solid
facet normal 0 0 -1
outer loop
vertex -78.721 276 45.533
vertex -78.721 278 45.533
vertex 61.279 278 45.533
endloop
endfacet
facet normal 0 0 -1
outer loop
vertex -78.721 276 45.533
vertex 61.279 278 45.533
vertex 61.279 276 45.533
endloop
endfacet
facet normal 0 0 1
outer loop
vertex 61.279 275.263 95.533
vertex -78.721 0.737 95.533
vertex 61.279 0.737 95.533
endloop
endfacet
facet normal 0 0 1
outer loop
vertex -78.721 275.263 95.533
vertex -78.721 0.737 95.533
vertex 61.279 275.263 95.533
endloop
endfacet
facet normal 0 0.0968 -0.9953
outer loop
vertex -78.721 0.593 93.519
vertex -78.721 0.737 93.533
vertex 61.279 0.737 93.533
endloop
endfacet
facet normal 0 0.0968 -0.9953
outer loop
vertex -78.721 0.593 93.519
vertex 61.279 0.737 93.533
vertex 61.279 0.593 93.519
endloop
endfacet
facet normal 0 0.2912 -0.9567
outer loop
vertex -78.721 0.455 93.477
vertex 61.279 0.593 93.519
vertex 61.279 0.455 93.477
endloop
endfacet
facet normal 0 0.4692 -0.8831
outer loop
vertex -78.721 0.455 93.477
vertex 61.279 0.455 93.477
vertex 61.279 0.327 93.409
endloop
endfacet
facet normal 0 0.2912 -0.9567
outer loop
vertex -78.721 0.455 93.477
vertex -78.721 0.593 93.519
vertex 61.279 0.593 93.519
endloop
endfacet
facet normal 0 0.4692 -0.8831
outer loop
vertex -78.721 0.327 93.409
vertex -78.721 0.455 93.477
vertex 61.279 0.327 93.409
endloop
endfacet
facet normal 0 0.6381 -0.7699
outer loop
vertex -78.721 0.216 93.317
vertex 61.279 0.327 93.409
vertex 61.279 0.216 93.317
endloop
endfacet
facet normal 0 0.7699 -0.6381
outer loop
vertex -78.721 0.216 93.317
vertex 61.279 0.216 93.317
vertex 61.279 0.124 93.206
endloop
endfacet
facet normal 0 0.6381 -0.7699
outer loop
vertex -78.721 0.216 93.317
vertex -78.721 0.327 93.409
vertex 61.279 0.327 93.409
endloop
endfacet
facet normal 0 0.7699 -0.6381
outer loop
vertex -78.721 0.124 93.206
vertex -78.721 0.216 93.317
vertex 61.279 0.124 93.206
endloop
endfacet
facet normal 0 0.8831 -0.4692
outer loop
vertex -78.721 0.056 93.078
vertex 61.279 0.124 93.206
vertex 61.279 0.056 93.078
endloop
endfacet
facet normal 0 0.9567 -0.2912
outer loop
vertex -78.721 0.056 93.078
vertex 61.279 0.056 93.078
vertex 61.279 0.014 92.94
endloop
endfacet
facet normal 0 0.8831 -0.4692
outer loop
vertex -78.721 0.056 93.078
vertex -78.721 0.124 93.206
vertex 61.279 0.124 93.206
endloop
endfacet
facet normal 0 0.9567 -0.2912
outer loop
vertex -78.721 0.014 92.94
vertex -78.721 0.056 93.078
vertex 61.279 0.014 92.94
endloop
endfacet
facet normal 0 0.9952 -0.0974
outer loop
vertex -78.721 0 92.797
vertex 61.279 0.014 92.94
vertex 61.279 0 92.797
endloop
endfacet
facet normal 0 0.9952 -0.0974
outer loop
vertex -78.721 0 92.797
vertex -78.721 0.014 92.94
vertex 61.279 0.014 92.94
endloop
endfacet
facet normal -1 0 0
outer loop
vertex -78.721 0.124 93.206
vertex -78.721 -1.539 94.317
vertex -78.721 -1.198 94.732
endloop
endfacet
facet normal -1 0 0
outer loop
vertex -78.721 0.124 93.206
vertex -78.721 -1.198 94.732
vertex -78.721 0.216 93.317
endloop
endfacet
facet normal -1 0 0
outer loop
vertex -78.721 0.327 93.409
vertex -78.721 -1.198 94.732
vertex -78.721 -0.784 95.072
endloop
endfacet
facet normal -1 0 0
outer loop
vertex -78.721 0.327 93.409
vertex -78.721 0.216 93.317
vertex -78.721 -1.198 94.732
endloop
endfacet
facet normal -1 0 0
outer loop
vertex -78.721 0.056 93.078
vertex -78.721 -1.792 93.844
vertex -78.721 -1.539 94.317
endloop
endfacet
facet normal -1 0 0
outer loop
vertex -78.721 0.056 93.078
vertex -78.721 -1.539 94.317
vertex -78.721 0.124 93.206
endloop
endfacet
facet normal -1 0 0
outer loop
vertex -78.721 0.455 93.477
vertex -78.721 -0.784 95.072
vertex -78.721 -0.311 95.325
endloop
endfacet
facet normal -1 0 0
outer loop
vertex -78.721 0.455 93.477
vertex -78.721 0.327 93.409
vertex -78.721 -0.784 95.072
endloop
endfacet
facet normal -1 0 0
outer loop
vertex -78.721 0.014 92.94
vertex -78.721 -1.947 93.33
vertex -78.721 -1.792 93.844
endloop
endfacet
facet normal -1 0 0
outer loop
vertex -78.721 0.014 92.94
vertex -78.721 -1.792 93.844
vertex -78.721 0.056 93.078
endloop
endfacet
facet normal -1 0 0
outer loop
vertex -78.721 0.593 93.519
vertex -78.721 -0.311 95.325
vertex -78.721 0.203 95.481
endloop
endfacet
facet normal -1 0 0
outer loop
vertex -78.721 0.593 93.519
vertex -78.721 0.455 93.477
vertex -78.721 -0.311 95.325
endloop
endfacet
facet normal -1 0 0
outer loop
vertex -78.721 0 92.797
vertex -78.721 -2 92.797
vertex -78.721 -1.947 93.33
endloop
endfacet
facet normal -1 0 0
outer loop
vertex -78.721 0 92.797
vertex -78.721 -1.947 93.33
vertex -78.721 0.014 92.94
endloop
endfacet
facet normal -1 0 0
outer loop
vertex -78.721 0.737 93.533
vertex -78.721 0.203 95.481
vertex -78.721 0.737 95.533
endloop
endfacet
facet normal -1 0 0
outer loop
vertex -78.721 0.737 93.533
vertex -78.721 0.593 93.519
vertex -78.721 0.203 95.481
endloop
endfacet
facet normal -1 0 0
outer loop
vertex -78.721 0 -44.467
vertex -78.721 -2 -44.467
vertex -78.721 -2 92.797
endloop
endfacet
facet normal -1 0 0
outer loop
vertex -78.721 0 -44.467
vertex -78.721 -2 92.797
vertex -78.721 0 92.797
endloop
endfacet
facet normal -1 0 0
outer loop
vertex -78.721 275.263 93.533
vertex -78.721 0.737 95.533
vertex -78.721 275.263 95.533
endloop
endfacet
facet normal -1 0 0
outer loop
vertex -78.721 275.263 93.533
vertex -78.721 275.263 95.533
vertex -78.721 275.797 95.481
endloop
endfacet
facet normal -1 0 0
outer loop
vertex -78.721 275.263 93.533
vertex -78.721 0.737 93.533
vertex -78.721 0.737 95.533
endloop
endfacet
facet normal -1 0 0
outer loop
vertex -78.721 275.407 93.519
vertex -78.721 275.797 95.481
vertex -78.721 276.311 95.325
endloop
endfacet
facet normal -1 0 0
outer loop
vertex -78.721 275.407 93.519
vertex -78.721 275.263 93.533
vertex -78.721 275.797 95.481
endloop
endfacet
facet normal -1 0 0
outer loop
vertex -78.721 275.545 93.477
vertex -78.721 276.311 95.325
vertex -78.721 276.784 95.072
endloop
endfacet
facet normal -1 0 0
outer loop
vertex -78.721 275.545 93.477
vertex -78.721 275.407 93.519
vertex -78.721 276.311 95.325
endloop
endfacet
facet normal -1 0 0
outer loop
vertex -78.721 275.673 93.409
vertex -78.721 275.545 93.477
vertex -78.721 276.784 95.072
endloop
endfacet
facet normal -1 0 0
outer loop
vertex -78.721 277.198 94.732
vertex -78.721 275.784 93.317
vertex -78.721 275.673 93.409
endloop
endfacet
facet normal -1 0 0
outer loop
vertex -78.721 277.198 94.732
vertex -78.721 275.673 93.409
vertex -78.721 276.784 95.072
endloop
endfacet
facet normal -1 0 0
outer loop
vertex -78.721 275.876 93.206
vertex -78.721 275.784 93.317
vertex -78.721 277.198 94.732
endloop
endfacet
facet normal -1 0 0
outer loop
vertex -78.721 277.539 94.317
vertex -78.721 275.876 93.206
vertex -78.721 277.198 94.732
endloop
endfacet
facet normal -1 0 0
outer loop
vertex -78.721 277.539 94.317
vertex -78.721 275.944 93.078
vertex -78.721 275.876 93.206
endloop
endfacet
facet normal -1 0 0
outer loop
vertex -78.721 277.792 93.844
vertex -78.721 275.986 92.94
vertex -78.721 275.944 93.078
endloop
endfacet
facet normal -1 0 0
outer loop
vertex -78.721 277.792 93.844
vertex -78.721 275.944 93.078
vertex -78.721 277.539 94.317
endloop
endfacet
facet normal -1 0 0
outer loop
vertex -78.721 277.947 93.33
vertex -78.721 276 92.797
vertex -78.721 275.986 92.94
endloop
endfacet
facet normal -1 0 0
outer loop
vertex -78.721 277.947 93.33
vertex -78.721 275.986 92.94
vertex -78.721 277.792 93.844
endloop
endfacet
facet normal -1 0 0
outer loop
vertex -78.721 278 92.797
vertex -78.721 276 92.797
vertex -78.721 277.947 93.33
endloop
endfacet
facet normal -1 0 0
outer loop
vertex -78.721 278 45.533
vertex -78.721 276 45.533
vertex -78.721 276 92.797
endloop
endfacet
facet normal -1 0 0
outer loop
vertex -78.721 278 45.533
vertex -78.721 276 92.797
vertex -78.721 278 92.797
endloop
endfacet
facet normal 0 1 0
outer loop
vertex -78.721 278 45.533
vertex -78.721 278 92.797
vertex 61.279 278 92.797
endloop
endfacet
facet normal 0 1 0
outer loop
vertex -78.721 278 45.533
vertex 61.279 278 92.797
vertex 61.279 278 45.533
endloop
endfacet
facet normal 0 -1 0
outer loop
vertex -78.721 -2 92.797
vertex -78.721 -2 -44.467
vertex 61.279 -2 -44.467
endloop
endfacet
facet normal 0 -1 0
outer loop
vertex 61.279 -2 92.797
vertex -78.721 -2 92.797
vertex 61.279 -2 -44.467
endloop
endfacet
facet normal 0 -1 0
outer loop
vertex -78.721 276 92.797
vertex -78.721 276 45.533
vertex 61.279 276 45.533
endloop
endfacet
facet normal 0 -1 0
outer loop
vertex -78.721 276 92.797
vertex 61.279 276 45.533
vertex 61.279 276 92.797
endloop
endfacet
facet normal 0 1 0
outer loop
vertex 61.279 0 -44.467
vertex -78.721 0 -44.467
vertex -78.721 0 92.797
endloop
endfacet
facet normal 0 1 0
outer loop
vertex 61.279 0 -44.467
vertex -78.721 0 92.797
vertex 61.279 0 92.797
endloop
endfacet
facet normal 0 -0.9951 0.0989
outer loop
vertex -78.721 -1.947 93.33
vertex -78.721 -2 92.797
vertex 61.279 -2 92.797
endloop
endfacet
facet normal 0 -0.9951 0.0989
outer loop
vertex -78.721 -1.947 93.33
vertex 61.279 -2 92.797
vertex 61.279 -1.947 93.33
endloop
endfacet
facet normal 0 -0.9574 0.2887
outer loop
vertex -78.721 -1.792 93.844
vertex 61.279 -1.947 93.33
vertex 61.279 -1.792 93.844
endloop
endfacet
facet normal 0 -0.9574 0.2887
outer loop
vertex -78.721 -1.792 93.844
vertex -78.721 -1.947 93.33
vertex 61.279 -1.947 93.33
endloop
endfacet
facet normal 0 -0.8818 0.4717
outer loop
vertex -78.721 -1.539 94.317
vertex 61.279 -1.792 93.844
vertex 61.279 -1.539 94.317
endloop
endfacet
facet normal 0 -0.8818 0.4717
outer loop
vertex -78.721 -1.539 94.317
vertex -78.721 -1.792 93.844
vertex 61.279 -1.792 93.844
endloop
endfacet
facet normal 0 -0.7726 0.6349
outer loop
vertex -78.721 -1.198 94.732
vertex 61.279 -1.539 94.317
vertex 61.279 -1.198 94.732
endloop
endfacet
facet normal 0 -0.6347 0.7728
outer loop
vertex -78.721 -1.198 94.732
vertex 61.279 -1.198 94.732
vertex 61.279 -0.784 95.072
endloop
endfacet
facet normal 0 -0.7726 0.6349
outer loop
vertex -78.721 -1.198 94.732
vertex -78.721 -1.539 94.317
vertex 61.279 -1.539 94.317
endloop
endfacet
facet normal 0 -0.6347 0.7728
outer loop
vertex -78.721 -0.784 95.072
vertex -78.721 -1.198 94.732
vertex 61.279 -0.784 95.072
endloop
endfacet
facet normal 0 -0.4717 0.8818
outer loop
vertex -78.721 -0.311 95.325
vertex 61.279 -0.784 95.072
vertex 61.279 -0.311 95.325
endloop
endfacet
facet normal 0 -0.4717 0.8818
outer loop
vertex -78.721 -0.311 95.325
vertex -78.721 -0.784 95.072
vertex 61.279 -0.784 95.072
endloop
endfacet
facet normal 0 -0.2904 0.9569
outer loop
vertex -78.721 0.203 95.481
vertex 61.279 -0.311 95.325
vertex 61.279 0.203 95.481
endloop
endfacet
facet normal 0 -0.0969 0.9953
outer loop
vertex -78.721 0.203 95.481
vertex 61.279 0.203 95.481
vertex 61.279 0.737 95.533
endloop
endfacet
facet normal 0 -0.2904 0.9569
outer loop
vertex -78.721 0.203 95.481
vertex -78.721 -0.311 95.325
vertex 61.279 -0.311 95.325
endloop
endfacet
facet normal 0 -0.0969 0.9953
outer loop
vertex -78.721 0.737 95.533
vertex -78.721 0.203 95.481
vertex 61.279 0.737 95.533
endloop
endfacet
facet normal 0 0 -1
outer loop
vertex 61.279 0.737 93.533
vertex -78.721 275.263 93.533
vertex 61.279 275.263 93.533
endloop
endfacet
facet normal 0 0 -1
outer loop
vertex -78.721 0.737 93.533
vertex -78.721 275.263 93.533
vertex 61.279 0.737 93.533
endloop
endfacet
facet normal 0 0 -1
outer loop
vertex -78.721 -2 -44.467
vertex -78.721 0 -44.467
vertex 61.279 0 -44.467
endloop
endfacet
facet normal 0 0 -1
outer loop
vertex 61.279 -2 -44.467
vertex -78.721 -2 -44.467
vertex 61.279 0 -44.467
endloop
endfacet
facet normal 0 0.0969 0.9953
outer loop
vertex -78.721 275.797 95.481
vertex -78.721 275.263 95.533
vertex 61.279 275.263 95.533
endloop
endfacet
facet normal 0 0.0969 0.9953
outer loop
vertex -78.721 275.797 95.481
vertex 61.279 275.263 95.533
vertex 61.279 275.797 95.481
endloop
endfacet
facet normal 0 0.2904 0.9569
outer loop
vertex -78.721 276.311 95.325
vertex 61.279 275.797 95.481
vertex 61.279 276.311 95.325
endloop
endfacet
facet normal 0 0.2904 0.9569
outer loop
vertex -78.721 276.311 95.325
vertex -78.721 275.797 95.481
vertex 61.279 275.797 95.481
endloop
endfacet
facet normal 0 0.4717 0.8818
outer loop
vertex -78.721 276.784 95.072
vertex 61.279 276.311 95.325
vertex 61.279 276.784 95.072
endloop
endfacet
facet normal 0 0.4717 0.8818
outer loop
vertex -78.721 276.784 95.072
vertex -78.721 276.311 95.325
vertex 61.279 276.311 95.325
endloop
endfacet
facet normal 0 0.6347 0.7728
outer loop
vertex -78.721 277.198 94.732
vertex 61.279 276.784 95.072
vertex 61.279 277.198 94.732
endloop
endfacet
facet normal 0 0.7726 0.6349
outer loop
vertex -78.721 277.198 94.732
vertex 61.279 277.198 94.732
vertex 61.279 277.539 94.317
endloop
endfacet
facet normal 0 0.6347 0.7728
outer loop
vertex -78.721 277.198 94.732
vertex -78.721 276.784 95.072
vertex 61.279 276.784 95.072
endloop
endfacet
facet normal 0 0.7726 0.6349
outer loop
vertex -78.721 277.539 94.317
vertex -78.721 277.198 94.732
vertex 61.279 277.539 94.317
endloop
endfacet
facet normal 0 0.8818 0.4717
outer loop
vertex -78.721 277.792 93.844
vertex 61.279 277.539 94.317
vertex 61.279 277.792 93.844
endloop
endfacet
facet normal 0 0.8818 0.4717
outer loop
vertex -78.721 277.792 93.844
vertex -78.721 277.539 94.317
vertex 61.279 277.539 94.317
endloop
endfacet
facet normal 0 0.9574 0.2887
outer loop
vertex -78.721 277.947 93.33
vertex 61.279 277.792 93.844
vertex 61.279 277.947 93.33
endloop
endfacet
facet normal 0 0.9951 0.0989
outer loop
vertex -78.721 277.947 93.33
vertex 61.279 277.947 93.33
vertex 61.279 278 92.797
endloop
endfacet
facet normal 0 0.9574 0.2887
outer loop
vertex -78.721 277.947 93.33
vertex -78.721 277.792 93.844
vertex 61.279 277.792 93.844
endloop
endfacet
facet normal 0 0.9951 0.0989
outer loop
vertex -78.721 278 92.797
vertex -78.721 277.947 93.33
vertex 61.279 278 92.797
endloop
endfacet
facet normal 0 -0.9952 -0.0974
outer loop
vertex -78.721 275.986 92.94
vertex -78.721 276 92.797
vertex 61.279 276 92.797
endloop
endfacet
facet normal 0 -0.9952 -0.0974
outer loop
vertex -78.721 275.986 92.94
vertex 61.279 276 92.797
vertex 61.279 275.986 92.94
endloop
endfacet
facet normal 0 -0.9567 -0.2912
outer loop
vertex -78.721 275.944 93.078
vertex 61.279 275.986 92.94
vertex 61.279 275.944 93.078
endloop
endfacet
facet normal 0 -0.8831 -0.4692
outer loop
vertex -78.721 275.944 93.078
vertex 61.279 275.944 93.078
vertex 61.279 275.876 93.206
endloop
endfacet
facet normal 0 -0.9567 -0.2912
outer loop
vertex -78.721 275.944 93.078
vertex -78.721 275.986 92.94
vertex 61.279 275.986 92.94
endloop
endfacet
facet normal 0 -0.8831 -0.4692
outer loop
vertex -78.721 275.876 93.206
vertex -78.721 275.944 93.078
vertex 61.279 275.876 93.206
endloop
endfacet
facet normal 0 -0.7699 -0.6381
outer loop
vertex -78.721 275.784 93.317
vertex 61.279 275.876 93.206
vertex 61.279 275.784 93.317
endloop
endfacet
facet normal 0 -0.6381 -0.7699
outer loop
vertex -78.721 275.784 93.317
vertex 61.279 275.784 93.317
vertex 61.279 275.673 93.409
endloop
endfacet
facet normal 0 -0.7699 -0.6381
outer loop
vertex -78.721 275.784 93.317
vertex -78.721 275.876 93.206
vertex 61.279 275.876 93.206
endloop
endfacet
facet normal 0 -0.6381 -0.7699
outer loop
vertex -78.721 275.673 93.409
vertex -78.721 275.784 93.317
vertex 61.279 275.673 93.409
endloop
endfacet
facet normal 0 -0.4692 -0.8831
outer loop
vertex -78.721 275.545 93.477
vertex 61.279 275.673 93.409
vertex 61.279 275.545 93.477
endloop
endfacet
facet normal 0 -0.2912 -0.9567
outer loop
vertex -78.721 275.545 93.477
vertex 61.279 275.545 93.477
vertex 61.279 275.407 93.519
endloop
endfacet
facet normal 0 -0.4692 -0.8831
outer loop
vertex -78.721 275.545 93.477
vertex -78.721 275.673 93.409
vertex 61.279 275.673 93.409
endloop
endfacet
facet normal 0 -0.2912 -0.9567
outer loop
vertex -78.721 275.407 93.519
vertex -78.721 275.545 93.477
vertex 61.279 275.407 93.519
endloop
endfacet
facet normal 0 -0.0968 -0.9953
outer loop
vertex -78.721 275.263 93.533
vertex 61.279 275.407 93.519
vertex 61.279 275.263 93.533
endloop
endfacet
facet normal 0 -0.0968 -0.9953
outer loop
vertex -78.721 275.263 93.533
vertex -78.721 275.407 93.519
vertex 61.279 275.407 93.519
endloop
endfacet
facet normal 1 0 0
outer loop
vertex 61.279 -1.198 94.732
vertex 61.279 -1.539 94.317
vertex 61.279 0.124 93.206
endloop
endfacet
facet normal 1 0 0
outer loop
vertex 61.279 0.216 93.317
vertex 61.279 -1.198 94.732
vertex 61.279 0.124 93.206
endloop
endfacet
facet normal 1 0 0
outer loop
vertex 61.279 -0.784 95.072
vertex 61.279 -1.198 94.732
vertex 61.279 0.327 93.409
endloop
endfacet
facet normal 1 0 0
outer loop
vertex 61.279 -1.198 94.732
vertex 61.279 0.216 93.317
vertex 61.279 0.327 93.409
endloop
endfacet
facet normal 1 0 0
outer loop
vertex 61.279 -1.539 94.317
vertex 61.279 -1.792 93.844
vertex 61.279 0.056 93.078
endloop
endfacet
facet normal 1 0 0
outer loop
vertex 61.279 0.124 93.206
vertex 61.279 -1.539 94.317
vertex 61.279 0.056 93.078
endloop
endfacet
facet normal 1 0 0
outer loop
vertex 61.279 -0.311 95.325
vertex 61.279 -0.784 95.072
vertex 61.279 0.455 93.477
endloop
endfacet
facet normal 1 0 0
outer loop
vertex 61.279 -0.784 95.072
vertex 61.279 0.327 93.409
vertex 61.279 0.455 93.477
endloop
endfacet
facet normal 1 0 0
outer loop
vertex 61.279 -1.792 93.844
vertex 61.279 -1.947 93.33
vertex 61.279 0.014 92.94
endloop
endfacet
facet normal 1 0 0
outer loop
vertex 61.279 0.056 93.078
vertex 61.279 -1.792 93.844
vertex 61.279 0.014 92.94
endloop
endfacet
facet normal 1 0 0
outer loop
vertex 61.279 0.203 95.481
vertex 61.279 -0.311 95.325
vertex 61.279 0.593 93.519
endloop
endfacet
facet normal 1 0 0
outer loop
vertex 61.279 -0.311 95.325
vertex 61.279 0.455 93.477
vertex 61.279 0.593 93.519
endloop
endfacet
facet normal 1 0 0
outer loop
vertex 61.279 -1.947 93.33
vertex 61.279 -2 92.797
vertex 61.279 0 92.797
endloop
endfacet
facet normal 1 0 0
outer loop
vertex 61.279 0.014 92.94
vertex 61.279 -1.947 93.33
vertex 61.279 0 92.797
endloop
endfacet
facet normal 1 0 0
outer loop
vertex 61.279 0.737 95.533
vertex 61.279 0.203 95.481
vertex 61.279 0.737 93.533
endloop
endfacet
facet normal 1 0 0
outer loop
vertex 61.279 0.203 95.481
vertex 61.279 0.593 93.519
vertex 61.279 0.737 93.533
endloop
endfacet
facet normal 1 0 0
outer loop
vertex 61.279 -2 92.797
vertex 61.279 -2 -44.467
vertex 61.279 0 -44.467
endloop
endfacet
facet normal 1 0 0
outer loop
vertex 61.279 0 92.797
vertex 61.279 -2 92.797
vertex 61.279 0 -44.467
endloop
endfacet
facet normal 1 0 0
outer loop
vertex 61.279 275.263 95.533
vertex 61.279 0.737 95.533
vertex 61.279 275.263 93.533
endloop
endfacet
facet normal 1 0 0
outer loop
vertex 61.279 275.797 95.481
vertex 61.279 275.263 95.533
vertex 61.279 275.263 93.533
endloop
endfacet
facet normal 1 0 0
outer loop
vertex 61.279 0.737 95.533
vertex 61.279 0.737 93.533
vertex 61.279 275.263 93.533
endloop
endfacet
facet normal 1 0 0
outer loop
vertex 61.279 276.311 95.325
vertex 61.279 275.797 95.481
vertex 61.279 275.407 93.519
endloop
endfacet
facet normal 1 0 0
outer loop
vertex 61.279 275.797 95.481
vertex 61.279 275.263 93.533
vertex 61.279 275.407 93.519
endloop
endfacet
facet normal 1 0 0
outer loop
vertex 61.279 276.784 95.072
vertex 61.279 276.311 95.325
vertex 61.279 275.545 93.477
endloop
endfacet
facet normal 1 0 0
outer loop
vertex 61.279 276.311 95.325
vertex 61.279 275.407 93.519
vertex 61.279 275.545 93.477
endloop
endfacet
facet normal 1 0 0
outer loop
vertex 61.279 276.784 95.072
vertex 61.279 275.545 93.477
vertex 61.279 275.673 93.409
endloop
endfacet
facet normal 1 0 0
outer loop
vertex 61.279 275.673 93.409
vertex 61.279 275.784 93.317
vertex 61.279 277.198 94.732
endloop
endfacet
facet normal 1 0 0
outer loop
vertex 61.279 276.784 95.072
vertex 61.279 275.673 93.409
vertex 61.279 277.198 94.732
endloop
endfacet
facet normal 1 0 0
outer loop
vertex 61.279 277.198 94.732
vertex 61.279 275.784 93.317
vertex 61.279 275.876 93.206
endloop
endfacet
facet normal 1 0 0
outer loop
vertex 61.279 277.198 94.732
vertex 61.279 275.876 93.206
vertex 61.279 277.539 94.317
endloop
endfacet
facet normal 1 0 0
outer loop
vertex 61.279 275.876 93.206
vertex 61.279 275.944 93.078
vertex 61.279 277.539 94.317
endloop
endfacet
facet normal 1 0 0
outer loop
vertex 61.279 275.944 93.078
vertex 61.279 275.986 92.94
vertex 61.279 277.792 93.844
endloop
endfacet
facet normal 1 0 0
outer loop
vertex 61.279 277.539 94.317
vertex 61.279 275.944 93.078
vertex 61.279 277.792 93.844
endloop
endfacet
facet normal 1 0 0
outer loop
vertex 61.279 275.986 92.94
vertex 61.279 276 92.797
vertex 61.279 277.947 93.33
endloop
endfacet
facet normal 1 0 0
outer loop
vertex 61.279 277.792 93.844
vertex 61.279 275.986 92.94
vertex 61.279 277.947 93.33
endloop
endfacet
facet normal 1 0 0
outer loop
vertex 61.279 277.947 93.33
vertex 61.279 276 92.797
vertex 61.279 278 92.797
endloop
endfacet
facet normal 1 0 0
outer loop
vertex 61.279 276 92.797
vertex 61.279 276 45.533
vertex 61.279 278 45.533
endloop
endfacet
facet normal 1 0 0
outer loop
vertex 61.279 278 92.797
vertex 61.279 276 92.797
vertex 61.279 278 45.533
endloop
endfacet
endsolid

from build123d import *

# Parameters (mm, degrees)
SKETCH1_W                    = 140
SKETCH1_H                    = 140
BASE_FLANGE1_DEPTH           = 2
EDGE_FLANGE2_STRIP_W         = 9.4732
EDGE_FLANGE2_STRIP_H         = 2
EDGE_FLANGE2_STRIP_CUT_DEPTH = 140
EDGE_FLANGE2_DEPTH           = 140
EDGE_FLANGE3_STRIP_W         = 9.4732
EDGE_FLANGE3_STRIP_H         = 2
EDGE_FLANGE3_STRIP_CUT_DEPTH = 140
EDGE_FLANGE3_DEPTH           = 140


# Sheet-metal steps are written as plain solids
with BuildPart() as part:
    # Sketch1 → Base-Flange1 (new body)
    with BuildSketch(Plane(origin=(0, 0, 0), x_dir=(1, 0, 0), z_dir=(0, 1, 0))):
        with Locations((-8.720538721, -25.533108866)):
            Rectangle(SKETCH1_W, SKETCH1_H)
    extrude(amount=-BASE_FLANGE1_DEPTH)

    # Edge-Flange2 strip (across the edge) → Edge-Flange2 strip cut (cut)
    with BuildSketch(Plane(origin=(-78.720538721, 0, 95.533108866), x_dir=(0, 0, -1), z_dir=(1, 0, 0))):
        with Locations((-2, -1)):
            Rectangle(EDGE_FLANGE2_STRIP_W, EDGE_FLANGE2_STRIP_H)
    extrude(amount=EDGE_FLANGE2_STRIP_CUT_DEPTH, mode=Mode.SUBTRACT)

    # Edge-Flange2 section (across the edge) → Edge-Flange2 (add)
    with BuildSketch(Plane(origin=(-78.720538721, 0, 95.533108866), x_dir=(0, 0, -1), z_dir=(1, 0, 0))):
        with BuildLine():
            Line((0, 0.7366), (0, 278))
            Line((0, 278), (2, 278))
            Line((2, 278), (2, 0.7366))
            ThreePointArc((2, 0.7366), (2.215745145, 0.215745145), (2.7366, 0))
            Line((2.7366, 0), (2.7366, -2))
            ThreePointArc((2.7366, -2), (0.801531583, -1.198468417), (0, 0.7366))
        make_face()
    extrude(amount=EDGE_FLANGE2_DEPTH)

    # Edge-Flange3 strip (across the edge) → Edge-Flange3 strip cut (cut)
    with BuildSketch(Plane(origin=(-78.720538721, 278, 93.533108866), x_dir=(0, -1, 0), z_dir=(1, 0, 0))):
        with Locations((-2, -1)):
            Rectangle(EDGE_FLANGE3_STRIP_W, EDGE_FLANGE3_STRIP_H)
    extrude(amount=EDGE_FLANGE3_STRIP_CUT_DEPTH, mode=Mode.SUBTRACT)

    # Edge-Flange3 section (across the edge) → Edge-Flange3 (add)
    with BuildSketch(Plane(origin=(-78.720538721, 278, 93.533108866), x_dir=(0, -1, 0), z_dir=(1, 0, 0))):
        with BuildLine():
            Line((0, 0.7366), (0, 48))
            Line((0, 48), (2, 48))
            Line((2, 48), (2, 0.7366))
            ThreePointArc((2, 0.7366), (2.215745145, 0.215745145), (2.7366, 0))
            Line((2.7366, 0), (2.7366, -2))
            ThreePointArc((2.7366, -2), (0.801531583, -1.198468417), (0, 0.7366))
        make_face()
    extrude(amount=EDGE_FLANGE3_DEPTH)


solid = part.part
